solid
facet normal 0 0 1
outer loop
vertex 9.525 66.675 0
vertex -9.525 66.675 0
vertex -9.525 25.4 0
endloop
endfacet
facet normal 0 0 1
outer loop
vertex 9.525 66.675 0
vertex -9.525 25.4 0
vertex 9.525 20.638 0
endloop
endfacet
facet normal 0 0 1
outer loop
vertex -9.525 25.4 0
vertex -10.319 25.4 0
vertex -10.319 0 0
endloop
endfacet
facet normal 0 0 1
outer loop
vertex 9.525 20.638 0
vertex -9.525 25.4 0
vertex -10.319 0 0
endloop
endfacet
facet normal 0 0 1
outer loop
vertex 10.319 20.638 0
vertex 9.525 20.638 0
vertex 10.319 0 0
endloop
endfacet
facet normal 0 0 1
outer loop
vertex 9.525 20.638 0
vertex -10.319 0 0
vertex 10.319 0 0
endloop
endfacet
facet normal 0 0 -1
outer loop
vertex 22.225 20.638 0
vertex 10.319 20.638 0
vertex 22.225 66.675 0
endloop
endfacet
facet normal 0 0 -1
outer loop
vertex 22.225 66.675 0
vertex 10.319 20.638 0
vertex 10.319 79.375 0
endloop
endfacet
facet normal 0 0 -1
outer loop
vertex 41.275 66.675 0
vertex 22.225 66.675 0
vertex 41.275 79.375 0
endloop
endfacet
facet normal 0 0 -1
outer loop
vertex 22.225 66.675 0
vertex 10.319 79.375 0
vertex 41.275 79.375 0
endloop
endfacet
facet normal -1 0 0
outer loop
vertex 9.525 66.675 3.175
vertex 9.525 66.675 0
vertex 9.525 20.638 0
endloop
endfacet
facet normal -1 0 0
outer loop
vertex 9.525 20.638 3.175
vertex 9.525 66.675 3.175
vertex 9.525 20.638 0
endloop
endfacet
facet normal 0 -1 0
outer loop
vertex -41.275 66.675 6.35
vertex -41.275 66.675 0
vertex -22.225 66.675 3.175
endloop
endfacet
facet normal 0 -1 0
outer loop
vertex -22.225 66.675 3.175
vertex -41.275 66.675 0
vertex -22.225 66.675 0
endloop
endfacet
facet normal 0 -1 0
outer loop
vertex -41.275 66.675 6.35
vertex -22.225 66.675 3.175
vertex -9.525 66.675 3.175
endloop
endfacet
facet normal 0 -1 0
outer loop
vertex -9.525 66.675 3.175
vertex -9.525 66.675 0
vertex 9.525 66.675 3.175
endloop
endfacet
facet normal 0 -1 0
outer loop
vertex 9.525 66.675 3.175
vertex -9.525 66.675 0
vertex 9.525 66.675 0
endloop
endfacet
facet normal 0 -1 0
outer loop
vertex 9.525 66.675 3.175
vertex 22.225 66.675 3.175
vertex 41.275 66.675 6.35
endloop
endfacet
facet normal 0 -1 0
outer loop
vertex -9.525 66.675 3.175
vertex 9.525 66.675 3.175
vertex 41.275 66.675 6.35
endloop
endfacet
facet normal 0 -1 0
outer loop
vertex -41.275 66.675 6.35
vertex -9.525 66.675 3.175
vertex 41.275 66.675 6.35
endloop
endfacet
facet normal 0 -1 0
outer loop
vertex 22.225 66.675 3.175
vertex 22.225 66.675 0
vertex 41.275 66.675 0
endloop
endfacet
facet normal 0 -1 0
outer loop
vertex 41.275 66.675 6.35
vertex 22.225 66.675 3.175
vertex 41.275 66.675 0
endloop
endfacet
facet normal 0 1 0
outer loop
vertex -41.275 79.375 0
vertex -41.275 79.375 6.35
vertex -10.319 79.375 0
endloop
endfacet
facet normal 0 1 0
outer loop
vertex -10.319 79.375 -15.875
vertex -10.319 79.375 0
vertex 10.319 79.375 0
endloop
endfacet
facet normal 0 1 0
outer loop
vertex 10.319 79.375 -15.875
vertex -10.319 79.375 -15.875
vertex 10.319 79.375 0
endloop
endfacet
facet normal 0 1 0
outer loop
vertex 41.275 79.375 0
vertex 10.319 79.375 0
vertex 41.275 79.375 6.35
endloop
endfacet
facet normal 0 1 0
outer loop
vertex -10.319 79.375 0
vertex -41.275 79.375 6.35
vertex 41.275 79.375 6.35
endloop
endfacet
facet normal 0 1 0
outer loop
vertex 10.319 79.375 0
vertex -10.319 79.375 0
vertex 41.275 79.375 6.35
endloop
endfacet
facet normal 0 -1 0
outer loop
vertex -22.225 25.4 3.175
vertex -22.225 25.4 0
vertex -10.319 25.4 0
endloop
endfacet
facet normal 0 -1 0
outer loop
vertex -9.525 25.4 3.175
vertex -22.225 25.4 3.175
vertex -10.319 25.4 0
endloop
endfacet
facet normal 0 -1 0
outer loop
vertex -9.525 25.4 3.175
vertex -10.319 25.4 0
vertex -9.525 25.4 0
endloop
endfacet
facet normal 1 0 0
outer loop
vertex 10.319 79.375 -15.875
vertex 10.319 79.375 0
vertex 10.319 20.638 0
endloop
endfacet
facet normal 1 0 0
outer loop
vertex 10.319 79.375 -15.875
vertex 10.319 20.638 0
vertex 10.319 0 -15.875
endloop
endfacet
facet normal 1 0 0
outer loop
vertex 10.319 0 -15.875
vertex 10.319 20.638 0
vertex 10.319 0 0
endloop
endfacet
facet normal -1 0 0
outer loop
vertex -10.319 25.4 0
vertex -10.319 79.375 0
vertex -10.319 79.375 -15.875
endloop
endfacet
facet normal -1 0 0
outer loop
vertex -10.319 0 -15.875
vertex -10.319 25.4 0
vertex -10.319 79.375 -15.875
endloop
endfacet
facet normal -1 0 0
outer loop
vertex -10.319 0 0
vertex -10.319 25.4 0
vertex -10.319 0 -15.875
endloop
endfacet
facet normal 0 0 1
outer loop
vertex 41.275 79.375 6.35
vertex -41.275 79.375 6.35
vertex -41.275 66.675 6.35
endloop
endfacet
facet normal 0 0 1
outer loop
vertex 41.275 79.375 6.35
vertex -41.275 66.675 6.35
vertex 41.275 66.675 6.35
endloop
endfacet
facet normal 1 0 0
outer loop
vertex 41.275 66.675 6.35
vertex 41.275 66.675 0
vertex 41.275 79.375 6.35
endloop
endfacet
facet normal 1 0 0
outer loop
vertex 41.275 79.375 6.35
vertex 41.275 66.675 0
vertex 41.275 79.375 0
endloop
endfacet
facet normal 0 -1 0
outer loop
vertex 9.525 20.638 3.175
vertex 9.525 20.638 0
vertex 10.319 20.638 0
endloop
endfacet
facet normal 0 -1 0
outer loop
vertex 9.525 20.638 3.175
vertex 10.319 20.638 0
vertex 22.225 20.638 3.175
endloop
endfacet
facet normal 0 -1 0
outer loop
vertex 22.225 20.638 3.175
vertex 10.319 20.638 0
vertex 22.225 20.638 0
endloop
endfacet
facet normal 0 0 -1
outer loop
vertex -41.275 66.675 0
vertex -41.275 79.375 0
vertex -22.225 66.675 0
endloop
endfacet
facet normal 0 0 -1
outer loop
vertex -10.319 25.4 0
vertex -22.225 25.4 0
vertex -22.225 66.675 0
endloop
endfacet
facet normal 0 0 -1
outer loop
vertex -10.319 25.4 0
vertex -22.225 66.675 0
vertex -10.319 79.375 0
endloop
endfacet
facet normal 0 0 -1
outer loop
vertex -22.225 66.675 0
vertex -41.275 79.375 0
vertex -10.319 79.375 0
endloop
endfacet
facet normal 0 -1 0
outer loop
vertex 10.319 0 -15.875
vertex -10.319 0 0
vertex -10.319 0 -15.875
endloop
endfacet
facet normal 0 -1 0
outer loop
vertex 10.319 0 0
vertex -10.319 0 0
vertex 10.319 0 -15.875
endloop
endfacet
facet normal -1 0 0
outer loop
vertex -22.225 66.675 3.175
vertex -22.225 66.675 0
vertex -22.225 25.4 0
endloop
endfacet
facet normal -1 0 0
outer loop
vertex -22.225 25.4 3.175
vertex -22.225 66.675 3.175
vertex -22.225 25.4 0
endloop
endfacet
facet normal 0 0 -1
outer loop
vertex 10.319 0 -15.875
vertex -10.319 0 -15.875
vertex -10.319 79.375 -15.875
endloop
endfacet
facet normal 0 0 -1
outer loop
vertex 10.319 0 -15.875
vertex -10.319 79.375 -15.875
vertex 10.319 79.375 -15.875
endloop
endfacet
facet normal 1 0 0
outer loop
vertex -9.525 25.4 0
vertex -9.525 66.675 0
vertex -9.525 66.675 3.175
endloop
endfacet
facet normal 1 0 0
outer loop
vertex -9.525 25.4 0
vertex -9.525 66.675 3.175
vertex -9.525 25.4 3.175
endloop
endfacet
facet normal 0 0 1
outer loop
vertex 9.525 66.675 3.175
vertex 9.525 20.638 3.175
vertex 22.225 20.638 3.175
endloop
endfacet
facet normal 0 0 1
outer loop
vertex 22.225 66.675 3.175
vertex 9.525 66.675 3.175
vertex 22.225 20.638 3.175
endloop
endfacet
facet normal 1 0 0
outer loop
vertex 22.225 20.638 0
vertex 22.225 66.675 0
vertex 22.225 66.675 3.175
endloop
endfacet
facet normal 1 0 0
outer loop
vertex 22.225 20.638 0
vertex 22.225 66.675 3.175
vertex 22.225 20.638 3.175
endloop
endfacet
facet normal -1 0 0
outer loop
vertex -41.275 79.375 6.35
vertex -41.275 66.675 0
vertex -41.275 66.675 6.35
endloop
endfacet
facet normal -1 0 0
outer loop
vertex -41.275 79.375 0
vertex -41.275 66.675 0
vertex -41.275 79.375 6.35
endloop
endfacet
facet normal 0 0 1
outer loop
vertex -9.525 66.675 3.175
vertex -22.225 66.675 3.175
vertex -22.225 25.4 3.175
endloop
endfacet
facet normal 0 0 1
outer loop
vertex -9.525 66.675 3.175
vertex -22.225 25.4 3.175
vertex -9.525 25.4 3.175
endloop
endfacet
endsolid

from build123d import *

# Parameters (mm, degrees)
F0_W     = 82.55
F0_H     = 12.7
F1_DEPTH = 6.35
F2_W     = 12.7
F2_H     = 53.975
F2_H_2   = 58.7375
F3_DEPTH = 3.175
F4_W     = 20.6375
F4_H     = 79.375
F5_DEPTH = 15.875


with BuildPart() as f1:
    # F0 (on Top) → F1 (new body)
    with BuildSketch(Plane.XY):
        with Locations((0, 73.025)):
            Rectangle(F0_W, F0_H)
    extrude(amount=F1_DEPTH)

    # F2 (on face) → F3 (join)
    with BuildSketch(Plane(origin=(0, 0, 0), x_dir=(1, 0, 0), z_dir=(0, 0, -1))):
        with Locations((-15.875, -52.3875)):
            Rectangle(F2_W, F2_H)
        with Locations((15.875, -50.00625)):
            Rectangle(F2_W, F2_H_2)
    extrude(amount=-F3_DEPTH)

    # F4 (on face) → F5 (join)
    with BuildSketch(Plane(origin=(0, 0, 0), x_dir=(1, 0, 0), z_dir=(0, 0, -1))):
        with Locations((0, -39.6875)):
            Rectangle(F4_W, F4_H)
    extrude(amount=F5_DEPTH)


solid = f1.part
